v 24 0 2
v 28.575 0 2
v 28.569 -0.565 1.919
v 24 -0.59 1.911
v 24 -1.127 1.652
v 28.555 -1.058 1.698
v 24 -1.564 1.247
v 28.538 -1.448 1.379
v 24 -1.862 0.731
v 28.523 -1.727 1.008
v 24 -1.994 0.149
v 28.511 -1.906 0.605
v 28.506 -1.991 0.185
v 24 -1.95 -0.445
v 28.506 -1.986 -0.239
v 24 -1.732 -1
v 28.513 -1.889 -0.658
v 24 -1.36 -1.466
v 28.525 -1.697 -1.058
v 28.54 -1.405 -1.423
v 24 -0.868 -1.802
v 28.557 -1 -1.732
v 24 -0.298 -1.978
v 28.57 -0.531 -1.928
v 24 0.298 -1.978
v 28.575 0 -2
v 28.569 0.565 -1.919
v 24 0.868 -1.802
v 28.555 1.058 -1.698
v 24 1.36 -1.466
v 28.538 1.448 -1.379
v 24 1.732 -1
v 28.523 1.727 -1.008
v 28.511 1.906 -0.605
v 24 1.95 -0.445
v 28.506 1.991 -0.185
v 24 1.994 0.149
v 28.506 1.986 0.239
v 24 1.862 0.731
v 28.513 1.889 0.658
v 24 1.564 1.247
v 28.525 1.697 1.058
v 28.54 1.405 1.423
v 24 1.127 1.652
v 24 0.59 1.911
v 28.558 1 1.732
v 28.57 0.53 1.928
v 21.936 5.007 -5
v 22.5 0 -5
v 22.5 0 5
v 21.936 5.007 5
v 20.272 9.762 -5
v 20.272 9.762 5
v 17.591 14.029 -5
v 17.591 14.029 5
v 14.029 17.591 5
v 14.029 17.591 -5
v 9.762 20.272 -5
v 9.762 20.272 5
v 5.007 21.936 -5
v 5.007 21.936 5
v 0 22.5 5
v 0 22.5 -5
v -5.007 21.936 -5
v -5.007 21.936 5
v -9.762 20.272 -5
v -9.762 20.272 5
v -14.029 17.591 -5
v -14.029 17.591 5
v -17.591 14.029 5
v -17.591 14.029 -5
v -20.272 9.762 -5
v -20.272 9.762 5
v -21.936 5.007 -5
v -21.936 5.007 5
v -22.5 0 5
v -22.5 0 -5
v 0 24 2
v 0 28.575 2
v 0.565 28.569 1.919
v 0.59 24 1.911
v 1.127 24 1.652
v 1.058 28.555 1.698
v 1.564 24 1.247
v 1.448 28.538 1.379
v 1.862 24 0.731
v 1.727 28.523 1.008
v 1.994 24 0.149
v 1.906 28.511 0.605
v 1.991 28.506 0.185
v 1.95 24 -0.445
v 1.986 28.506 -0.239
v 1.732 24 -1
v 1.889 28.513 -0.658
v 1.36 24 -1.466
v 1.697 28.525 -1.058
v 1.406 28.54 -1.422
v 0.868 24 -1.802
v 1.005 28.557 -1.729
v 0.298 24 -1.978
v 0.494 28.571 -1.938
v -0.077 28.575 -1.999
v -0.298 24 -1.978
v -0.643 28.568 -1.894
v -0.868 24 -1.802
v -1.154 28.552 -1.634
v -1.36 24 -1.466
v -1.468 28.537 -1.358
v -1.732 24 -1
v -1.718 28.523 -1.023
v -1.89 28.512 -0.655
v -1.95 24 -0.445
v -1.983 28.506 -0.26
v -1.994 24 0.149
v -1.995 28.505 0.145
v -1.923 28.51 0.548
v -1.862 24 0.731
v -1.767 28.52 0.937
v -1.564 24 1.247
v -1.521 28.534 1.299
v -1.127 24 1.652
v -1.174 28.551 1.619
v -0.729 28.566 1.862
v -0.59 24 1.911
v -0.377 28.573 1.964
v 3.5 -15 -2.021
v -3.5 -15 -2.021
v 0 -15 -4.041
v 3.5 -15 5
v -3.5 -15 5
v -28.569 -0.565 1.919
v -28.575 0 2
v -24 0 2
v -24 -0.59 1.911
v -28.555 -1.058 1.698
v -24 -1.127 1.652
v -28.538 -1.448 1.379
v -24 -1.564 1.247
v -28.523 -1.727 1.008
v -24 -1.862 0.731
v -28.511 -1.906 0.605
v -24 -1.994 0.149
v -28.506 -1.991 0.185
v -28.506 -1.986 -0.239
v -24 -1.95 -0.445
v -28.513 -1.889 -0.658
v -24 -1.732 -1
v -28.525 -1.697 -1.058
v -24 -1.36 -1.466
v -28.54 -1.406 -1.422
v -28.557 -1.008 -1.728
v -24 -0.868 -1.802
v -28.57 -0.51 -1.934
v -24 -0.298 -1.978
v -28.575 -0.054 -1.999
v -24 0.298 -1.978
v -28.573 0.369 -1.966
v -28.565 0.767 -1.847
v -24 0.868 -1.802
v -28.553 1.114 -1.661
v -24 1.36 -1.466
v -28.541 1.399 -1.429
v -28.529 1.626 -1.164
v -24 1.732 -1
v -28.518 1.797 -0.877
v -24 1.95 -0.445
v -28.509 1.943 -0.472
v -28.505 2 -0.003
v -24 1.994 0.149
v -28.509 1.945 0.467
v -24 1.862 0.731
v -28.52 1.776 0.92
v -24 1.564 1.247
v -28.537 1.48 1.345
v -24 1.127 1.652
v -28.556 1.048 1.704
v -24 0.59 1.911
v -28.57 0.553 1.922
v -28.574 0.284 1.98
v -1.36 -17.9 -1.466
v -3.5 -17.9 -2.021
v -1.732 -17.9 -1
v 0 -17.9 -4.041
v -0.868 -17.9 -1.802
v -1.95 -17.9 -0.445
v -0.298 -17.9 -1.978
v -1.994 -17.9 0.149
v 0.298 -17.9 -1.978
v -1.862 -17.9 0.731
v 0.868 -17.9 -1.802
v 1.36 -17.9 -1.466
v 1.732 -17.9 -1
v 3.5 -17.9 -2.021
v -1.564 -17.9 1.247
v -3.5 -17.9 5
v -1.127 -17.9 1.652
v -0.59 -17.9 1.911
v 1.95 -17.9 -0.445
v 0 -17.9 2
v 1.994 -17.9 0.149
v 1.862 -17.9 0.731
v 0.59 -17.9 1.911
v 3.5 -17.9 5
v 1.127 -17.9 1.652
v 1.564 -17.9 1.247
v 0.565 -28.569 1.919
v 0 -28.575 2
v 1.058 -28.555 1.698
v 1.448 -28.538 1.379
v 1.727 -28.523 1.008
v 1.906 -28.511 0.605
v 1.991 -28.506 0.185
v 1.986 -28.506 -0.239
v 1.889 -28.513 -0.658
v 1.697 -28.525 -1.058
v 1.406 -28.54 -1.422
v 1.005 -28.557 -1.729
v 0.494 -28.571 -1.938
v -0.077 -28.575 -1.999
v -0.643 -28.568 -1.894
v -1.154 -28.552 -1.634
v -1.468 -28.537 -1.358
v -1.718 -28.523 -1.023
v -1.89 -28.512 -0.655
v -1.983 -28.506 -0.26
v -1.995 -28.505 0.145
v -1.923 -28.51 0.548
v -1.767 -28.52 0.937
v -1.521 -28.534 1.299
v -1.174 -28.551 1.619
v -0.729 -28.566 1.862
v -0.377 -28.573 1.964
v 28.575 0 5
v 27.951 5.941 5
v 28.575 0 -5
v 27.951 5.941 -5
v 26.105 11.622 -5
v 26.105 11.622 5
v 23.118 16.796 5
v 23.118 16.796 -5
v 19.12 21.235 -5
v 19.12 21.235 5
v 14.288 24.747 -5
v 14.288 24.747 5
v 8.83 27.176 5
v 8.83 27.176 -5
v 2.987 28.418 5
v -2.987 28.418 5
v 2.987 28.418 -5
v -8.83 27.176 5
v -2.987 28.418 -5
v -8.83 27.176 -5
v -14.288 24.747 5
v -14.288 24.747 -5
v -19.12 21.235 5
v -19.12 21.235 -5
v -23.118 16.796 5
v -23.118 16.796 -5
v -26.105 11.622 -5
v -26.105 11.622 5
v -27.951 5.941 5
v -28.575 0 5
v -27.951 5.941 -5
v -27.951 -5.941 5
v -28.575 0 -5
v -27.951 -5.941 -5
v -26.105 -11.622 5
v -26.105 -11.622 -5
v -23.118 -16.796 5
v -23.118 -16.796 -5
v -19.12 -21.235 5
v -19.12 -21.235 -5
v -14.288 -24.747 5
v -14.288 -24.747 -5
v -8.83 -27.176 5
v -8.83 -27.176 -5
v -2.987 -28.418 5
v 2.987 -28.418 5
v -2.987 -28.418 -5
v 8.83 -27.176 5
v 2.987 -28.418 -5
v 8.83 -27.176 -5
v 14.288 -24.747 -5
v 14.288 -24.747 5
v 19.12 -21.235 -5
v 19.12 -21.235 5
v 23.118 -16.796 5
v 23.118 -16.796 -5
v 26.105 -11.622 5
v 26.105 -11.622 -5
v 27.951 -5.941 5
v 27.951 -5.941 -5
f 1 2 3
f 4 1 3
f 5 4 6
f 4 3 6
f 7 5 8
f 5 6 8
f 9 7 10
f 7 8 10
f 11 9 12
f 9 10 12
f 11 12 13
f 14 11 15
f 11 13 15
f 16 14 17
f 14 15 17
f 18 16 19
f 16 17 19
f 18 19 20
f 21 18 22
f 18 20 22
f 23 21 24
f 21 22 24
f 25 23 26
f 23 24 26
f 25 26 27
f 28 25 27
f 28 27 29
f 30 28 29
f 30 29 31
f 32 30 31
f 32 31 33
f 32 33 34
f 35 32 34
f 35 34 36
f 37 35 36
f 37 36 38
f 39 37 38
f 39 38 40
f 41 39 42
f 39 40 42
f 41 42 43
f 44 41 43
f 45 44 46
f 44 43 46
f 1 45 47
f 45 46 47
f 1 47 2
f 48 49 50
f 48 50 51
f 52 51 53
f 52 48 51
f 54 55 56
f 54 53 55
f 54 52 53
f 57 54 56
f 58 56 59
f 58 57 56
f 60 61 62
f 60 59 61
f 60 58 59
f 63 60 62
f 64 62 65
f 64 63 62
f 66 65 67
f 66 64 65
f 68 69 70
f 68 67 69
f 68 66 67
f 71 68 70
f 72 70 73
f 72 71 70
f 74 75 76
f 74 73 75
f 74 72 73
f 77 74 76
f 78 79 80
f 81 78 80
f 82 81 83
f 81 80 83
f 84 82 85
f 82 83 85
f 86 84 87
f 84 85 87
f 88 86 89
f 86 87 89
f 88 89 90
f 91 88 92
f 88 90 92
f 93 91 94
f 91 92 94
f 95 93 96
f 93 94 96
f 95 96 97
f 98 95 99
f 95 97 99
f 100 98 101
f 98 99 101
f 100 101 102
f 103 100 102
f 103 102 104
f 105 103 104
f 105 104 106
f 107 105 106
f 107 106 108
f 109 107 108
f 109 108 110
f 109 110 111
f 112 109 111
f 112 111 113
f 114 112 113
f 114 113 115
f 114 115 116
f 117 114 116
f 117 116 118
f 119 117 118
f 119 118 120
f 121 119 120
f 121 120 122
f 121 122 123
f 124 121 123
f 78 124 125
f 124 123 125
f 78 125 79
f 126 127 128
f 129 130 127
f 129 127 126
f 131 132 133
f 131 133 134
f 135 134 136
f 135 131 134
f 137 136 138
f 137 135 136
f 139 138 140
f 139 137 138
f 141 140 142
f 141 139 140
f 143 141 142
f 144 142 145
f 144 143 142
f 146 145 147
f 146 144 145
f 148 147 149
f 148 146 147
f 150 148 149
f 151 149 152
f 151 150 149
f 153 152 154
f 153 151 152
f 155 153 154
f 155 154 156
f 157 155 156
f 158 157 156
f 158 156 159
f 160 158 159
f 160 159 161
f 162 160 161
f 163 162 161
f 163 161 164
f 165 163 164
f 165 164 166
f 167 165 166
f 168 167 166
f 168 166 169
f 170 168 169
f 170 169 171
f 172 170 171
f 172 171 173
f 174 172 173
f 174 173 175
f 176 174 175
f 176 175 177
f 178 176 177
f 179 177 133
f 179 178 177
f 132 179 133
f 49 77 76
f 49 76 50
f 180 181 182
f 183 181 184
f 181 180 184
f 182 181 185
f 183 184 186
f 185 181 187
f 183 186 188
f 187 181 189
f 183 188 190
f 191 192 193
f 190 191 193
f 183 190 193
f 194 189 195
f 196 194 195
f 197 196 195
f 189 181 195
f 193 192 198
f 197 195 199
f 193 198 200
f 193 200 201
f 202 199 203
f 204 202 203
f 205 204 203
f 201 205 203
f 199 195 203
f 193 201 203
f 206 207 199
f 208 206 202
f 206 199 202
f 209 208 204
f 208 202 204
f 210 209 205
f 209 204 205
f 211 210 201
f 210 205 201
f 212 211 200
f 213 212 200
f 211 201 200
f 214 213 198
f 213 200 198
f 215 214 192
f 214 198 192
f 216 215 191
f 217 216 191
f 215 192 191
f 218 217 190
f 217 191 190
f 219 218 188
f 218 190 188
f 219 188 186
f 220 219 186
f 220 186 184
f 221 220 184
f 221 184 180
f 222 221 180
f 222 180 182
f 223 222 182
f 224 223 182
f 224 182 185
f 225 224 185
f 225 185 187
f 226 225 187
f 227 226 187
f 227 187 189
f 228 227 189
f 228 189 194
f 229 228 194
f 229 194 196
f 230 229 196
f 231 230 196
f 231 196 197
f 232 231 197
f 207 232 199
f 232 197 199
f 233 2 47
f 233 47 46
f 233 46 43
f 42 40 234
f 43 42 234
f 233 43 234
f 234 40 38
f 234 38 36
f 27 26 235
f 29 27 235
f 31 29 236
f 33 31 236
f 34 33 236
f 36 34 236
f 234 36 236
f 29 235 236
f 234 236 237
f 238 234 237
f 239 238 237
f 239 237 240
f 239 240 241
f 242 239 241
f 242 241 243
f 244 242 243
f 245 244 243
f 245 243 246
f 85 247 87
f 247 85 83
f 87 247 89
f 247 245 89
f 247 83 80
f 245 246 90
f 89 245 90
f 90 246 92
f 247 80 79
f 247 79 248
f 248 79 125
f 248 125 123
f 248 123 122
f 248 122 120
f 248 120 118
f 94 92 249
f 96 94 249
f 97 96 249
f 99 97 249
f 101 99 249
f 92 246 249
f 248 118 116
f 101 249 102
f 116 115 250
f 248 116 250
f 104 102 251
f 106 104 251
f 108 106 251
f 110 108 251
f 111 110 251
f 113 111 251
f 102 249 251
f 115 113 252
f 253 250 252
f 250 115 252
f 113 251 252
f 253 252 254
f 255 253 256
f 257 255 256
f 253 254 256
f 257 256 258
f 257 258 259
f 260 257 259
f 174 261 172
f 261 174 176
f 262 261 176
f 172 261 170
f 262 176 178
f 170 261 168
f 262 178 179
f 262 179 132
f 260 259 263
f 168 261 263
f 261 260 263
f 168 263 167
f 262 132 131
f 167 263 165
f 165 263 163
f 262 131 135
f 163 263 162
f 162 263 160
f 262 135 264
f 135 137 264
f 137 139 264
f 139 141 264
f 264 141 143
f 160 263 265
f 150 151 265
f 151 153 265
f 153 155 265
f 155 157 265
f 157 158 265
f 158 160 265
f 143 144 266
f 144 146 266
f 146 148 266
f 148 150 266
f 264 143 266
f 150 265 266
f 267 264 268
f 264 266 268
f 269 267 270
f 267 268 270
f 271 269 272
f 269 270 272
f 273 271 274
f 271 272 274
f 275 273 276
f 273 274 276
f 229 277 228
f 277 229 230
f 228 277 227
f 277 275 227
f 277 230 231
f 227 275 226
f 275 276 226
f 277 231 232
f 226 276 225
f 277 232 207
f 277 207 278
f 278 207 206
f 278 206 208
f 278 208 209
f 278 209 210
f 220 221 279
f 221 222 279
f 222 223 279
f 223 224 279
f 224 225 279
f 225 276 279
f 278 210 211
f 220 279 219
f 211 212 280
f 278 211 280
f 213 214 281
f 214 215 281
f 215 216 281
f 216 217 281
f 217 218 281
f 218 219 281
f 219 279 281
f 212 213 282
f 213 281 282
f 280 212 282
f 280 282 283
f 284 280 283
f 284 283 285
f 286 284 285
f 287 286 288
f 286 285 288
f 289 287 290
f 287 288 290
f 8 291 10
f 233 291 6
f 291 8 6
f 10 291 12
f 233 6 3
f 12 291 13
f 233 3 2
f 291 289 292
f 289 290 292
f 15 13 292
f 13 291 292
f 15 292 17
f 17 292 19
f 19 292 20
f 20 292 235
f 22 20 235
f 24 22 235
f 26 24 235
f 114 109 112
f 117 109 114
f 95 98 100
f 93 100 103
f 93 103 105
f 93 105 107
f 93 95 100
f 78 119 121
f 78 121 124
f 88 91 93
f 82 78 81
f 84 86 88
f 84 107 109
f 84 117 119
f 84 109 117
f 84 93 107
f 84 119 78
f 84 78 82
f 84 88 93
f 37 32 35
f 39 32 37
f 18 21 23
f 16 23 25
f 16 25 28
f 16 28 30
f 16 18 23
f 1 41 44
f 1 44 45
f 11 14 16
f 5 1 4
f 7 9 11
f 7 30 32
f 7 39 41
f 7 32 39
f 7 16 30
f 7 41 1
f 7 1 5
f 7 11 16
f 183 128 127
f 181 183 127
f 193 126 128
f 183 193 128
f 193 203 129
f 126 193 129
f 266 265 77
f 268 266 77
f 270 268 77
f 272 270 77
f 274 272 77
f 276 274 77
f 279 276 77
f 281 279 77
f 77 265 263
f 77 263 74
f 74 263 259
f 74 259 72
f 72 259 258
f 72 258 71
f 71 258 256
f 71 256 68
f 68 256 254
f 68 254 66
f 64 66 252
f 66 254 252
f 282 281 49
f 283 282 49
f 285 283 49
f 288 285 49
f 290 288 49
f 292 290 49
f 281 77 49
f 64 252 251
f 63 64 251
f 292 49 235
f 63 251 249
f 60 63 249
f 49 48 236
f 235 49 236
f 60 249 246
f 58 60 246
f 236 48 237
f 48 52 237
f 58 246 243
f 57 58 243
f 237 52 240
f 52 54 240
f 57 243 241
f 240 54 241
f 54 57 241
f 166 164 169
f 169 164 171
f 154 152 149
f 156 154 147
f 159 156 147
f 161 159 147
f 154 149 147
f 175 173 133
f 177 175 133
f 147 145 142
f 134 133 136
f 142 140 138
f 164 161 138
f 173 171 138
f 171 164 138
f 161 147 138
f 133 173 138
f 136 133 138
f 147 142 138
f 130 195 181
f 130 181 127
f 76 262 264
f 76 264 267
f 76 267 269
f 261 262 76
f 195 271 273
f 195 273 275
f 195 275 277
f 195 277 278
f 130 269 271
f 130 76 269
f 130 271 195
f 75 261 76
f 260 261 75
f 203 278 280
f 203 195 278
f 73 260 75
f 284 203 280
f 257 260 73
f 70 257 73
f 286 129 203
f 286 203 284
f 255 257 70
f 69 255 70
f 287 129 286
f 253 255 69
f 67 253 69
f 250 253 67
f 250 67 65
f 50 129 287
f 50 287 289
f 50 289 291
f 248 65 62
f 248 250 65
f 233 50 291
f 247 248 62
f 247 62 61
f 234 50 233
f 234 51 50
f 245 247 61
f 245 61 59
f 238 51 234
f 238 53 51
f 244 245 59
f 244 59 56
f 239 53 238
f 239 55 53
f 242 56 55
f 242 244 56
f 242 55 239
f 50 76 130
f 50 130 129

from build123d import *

# Parameters (mm, degrees)
BOSS_EXTRUDE1_DEPTH      = 5
BOSS_EXTRUDE1_DEPTH_BACK = 5
SKETCH1_R                = 28.575
CUT_EXTRUDE12_START      = 29
SKETCH15_R               = 2
CUT_EXTRUDE12_DEPTH      = 5
CUT_EXTRUDE13_START      = -29
SKETCH16_R               = 2
CUT_EXTRUDE13_DEPTH      = 5
CUT_EXTRUDE14_START      = -15
CUT_EXTRUDE14_DEPTH      = 2.9
CUT_EXTRUDE15_DEPTH      = 41.719298408
CUT_EXTRUDE15_DEPTH_BACK = 41.719298408
SKETCH21_W               = 7
SKETCH21_H               = 2.9
CUT_EXTRUDE16_DEPTH      = 5
SKETCH22_R               = 2
CUT_EXTRUDE17_DEPTH      = 55.785547971


with BuildPart() as part:
    # Sketch1 → Boss-Extrude1 (new, two sides: drawn at the far end of the back side and taken through both)
    with BuildSketch(Plane.XY.offset(-BOSS_EXTRUDE1_DEPTH_BACK)):
        Circle(SKETCH1_R)
    extrude(amount=BOSS_EXTRUDE1_DEPTH + BOSS_EXTRUDE1_DEPTH_BACK)

    # Sketch15 → Cut-Extrude12 (cut)
    with BuildSketch(Plane(origin=(0, 0, 0), x_dir=(1, 0, 0), z_dir=(0, 1, 0)).offset(CUT_EXTRUDE12_START)):
        Circle(SKETCH15_R)
    extrude(amount=-CUT_EXTRUDE12_DEPTH, mode=Mode.SUBTRACT)

    # Sketch16 → Cut-Extrude13 (cut)
    with BuildSketch(Plane(origin=(0, 0, 0), x_dir=(0, 0, -1), z_dir=(1, 0, 0)).offset(CUT_EXTRUDE13_START)):
        Circle(SKETCH16_R)
    cut_extrude13 = extrude(amount=CUT_EXTRUDE13_DEPTH, mode=Mode.SUBTRACT)

    # Sketch19 → Cut-Extrude14 (cut)
    with BuildSketch(Plane(origin=(0, 0, 0), x_dir=(1, 0, 0), z_dir=(0, 1, 0)).offset(CUT_EXTRUDE14_START)):
        Polygon((0, 4.041451884), (-3.5, 2.020725942), (-3.5, -2.020725942), (0, -4.041451884), (3.5, -2.020725942), (3.5, 2.020725942), align=None)
    extrude(amount=-CUT_EXTRUDE14_DEPTH, mode=Mode.SUBTRACT)

    # Sketch20 → Cut-Extrude15 (cut, two sides: drawn at the far end of the back side and taken through both)
    with BuildSketch(Plane.XY.offset(-CUT_EXTRUDE15_DEPTH_BACK)):
        with BuildLine():
            Line((-22.5, 0), (22.5, 0))
            ThreePointArc((22.5, 0), (0, 22.5), (-22.5, 0))
        make_face()
    extrude(amount=CUT_EXTRUDE15_DEPTH + CUT_EXTRUDE15_DEPTH_BACK, mode=Mode.SUBTRACT)

    # Mirror1: Cut-Extrude13 across plane
    add(cut_extrude13.mirror(Plane(origin=(0, 0, 0), x_dir=(0, 0, 1), z_dir=(1, 0, 0))), mode=Mode.SUBTRACT)

    # Sketch21 → Cut-Extrude16 (cut)
    with BuildSketch(Plane.XY.offset(5)):
        with Locations((0, -16.45)):
            Rectangle(SKETCH21_W, SKETCH21_H)
    extrude(amount=-CUT_EXTRUDE16_DEPTH, mode=Mode.SUBTRACT)

    # Sketch22 → Cut-Extrude17 (cut, through all)
    with BuildSketch(Plane(origin=(0, -17.9, 0), x_dir=(1, 0, 0), z_dir=(0, 1, 0))):
        Circle(SKETCH22_R)
    extrude(amount=-CUT_EXTRUDE17_DEPTH, mode=Mode.SUBTRACT)


solid = part.part
